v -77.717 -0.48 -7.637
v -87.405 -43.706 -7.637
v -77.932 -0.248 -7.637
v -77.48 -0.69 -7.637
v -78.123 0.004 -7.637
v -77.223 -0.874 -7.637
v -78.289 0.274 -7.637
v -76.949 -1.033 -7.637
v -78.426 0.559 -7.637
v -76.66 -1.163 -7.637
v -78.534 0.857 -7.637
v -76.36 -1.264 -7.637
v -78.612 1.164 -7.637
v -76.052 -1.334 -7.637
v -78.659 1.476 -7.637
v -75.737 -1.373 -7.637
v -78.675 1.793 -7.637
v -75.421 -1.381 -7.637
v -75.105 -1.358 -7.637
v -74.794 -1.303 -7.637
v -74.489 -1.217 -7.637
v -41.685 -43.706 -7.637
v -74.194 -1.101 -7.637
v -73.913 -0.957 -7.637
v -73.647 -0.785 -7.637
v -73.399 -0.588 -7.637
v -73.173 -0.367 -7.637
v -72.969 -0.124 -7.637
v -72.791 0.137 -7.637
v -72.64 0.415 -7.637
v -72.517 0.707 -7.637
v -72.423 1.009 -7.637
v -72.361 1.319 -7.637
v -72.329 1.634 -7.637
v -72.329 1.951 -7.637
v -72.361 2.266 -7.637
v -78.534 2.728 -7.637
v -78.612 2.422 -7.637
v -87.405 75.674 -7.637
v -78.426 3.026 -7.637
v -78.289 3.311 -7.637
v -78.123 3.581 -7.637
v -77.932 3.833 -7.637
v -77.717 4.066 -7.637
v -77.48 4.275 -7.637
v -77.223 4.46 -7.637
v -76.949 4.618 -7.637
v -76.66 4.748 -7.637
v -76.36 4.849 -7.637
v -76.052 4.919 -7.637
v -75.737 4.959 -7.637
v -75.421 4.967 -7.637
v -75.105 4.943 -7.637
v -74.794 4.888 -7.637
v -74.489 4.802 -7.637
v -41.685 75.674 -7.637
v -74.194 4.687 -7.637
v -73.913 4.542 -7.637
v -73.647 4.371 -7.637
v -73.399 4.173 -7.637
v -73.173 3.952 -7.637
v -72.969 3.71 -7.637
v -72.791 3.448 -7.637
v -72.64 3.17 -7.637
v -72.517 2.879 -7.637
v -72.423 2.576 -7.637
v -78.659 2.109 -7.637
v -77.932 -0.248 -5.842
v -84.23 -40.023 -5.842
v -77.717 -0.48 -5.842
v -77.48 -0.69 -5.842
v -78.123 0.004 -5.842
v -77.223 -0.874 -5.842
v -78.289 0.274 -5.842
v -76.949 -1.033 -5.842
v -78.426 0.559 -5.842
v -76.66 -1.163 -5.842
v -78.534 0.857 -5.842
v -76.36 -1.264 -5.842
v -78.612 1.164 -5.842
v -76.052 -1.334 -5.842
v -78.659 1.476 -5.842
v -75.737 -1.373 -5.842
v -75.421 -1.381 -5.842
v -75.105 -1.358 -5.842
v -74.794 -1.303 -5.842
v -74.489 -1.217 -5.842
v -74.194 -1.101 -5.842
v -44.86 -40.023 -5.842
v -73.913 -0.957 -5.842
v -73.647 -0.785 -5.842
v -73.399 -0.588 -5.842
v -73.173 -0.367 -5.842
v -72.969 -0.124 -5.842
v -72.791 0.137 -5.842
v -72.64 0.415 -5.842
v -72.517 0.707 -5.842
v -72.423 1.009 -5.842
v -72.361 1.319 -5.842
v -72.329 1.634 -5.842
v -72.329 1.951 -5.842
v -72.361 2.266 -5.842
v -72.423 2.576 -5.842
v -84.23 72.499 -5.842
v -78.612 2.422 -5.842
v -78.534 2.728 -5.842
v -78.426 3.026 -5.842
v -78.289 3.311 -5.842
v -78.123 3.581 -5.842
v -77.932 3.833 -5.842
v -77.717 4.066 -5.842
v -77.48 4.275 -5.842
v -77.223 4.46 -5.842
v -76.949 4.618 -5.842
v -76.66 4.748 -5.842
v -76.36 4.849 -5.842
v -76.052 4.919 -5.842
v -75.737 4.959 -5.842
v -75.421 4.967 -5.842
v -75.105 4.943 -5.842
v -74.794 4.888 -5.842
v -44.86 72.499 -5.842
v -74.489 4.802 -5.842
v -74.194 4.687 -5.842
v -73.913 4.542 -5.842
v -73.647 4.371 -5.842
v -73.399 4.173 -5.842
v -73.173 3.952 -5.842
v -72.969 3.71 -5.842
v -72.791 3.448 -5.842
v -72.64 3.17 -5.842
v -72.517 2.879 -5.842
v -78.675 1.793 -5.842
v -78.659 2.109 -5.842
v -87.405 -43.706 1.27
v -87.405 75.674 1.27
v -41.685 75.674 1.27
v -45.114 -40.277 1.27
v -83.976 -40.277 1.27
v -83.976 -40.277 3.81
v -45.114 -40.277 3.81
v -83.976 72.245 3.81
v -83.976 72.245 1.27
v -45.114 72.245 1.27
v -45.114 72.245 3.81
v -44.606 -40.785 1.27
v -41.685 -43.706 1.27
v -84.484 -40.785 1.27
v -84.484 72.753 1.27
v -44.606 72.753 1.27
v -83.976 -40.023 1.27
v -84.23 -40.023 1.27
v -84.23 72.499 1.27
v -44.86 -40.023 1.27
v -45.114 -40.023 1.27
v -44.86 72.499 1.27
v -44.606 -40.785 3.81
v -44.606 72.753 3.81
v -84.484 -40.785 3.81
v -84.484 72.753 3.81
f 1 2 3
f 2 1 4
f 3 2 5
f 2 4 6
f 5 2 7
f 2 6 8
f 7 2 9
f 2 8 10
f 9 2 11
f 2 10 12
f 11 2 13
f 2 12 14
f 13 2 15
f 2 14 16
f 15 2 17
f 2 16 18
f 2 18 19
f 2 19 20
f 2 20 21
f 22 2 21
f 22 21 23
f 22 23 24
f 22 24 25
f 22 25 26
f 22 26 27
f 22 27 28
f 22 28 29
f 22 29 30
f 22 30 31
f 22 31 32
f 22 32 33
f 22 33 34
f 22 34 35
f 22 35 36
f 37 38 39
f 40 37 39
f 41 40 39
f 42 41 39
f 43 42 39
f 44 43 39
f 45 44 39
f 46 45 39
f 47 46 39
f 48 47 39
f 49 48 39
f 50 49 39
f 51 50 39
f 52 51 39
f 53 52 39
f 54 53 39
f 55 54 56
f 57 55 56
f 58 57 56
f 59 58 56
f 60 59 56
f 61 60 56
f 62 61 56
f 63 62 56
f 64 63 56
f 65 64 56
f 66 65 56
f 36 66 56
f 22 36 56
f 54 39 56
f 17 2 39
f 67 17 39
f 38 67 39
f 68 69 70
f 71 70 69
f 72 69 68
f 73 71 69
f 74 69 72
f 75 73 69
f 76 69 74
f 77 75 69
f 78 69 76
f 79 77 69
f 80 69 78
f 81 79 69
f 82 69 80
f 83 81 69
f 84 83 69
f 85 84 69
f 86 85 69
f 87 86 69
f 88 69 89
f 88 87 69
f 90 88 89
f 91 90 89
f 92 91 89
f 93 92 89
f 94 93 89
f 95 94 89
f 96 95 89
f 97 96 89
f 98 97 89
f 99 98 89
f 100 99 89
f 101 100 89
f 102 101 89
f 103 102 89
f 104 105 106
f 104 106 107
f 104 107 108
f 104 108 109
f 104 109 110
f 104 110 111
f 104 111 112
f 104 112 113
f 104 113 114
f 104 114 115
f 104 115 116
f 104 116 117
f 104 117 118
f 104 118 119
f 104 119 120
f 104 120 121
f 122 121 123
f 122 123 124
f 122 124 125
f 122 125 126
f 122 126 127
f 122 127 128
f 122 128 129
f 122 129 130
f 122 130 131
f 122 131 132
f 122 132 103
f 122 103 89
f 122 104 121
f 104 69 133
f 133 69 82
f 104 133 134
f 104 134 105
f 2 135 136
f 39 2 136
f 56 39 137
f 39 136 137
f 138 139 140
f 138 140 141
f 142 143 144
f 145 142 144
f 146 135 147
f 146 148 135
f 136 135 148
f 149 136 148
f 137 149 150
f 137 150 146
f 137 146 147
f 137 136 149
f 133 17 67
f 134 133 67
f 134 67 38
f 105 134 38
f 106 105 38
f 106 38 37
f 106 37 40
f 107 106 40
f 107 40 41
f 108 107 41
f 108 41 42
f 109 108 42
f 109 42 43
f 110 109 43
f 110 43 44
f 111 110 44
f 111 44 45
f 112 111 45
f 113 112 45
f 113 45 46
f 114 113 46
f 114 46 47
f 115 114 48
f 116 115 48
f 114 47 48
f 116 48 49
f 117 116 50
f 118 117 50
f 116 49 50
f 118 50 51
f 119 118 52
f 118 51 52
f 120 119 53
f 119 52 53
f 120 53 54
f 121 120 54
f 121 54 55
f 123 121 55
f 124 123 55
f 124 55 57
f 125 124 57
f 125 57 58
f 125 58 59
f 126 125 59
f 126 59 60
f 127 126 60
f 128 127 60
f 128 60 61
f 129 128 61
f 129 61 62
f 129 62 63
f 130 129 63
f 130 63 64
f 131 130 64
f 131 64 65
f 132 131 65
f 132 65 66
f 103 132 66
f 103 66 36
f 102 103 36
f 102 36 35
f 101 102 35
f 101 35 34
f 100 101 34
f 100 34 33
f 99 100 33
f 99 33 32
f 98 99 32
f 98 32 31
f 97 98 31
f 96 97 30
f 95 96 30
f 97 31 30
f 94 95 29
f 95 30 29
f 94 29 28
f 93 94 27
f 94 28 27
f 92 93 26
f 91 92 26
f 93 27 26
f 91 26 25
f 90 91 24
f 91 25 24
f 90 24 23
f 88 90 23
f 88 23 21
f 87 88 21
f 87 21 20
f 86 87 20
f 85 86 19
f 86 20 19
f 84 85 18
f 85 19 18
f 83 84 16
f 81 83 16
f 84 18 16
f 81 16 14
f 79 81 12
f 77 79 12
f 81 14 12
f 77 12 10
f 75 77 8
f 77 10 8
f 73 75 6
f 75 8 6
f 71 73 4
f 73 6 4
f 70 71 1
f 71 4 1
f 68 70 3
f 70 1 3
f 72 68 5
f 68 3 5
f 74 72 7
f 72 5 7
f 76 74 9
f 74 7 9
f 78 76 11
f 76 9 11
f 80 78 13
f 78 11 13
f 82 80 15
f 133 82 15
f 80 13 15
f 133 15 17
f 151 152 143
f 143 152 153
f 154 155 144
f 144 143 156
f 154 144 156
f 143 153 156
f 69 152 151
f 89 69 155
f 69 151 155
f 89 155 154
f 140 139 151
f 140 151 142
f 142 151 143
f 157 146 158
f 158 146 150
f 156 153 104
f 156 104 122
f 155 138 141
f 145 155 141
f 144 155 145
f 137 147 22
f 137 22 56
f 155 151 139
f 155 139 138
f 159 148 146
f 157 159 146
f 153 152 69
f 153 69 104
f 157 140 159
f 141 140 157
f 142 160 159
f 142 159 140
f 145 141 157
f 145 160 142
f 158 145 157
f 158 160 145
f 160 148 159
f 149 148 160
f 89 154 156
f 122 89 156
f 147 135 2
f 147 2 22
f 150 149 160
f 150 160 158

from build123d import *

# Parameters (mm, degrees)
SKETCH1_W                = 45.72
SKETCH1_H                = 119.38
BOSS_EXTRUDE1_DEPTH      = 1.27
BOSS_EXTRUDE1_DEPTH_BACK = 7.636822689
SKETCH2_W                = 39.878
SKETCH2_H                = 113.538
SKETCH2_W_2              = 38.862
SKETCH2_H_2              = 112.522
BOSS_EXTRUDE2_DEPTH      = 2.54
SKETCH4_R                = 3.175
CUT_EXTRUDE1_DEPTH       = 12.446822689
SKETCH12_W               = 39.37
SKETCH12_H               = 112.522
CUT_EXTRUDE3_DEPTH       = 7.112


with BuildPart() as part:
    # Sketch1 → Boss-Extrude1 (new body, two sides)
    with BuildSketch(Plane.XY) as boss_extrude1_sk:
        with Locations((-64.545156171, 15.983606897)):
            Rectangle(SKETCH1_W, SKETCH1_H)
    extrude(amount=BOSS_EXTRUDE1_DEPTH)
    extrude(boss_extrude1_sk.sketch, amount=-BOSS_EXTRUDE1_DEPTH_BACK)

    # Sketch2 → Boss-Extrude2 (add)
    with BuildSketch(Plane.XY.offset(1.27)):
        with Locations((-64.545156171, 15.983606897)):
            Rectangle(SKETCH2_W, SKETCH2_H)
        with Locations((-64.545156171, 15.983606897)):
            Rectangle(SKETCH2_W_2, SKETCH2_H_2, mode=Mode.SUBTRACT)
    extrude(amount=BOSS_EXTRUDE2_DEPTH)

    # Sketch4 → Cut-Extrude1 (cut, through all)
    with BuildSketch(Plane(origin=(0, 0, -7.636822689), x_dir=(-1, 0, 0), z_dir=(0, 0, -1))):
        with Locations((75.500176171, 1.792626897)):
            Circle(SKETCH4_R)
    extrude(amount=-CUT_EXTRUDE1_DEPTH, mode=Mode.SUBTRACT)

    # Sketch12 → Cut-Extrude3 (cut)
    with BuildSketch(Plane.XY.offset(1.27)):
        with Locations((-64.545156171, 16.237606897)):
            Rectangle(SKETCH12_W, SKETCH12_H)
    extrude(amount=-CUT_EXTRUDE3_DEPTH, mode=Mode.SUBTRACT)


solid = part.part
